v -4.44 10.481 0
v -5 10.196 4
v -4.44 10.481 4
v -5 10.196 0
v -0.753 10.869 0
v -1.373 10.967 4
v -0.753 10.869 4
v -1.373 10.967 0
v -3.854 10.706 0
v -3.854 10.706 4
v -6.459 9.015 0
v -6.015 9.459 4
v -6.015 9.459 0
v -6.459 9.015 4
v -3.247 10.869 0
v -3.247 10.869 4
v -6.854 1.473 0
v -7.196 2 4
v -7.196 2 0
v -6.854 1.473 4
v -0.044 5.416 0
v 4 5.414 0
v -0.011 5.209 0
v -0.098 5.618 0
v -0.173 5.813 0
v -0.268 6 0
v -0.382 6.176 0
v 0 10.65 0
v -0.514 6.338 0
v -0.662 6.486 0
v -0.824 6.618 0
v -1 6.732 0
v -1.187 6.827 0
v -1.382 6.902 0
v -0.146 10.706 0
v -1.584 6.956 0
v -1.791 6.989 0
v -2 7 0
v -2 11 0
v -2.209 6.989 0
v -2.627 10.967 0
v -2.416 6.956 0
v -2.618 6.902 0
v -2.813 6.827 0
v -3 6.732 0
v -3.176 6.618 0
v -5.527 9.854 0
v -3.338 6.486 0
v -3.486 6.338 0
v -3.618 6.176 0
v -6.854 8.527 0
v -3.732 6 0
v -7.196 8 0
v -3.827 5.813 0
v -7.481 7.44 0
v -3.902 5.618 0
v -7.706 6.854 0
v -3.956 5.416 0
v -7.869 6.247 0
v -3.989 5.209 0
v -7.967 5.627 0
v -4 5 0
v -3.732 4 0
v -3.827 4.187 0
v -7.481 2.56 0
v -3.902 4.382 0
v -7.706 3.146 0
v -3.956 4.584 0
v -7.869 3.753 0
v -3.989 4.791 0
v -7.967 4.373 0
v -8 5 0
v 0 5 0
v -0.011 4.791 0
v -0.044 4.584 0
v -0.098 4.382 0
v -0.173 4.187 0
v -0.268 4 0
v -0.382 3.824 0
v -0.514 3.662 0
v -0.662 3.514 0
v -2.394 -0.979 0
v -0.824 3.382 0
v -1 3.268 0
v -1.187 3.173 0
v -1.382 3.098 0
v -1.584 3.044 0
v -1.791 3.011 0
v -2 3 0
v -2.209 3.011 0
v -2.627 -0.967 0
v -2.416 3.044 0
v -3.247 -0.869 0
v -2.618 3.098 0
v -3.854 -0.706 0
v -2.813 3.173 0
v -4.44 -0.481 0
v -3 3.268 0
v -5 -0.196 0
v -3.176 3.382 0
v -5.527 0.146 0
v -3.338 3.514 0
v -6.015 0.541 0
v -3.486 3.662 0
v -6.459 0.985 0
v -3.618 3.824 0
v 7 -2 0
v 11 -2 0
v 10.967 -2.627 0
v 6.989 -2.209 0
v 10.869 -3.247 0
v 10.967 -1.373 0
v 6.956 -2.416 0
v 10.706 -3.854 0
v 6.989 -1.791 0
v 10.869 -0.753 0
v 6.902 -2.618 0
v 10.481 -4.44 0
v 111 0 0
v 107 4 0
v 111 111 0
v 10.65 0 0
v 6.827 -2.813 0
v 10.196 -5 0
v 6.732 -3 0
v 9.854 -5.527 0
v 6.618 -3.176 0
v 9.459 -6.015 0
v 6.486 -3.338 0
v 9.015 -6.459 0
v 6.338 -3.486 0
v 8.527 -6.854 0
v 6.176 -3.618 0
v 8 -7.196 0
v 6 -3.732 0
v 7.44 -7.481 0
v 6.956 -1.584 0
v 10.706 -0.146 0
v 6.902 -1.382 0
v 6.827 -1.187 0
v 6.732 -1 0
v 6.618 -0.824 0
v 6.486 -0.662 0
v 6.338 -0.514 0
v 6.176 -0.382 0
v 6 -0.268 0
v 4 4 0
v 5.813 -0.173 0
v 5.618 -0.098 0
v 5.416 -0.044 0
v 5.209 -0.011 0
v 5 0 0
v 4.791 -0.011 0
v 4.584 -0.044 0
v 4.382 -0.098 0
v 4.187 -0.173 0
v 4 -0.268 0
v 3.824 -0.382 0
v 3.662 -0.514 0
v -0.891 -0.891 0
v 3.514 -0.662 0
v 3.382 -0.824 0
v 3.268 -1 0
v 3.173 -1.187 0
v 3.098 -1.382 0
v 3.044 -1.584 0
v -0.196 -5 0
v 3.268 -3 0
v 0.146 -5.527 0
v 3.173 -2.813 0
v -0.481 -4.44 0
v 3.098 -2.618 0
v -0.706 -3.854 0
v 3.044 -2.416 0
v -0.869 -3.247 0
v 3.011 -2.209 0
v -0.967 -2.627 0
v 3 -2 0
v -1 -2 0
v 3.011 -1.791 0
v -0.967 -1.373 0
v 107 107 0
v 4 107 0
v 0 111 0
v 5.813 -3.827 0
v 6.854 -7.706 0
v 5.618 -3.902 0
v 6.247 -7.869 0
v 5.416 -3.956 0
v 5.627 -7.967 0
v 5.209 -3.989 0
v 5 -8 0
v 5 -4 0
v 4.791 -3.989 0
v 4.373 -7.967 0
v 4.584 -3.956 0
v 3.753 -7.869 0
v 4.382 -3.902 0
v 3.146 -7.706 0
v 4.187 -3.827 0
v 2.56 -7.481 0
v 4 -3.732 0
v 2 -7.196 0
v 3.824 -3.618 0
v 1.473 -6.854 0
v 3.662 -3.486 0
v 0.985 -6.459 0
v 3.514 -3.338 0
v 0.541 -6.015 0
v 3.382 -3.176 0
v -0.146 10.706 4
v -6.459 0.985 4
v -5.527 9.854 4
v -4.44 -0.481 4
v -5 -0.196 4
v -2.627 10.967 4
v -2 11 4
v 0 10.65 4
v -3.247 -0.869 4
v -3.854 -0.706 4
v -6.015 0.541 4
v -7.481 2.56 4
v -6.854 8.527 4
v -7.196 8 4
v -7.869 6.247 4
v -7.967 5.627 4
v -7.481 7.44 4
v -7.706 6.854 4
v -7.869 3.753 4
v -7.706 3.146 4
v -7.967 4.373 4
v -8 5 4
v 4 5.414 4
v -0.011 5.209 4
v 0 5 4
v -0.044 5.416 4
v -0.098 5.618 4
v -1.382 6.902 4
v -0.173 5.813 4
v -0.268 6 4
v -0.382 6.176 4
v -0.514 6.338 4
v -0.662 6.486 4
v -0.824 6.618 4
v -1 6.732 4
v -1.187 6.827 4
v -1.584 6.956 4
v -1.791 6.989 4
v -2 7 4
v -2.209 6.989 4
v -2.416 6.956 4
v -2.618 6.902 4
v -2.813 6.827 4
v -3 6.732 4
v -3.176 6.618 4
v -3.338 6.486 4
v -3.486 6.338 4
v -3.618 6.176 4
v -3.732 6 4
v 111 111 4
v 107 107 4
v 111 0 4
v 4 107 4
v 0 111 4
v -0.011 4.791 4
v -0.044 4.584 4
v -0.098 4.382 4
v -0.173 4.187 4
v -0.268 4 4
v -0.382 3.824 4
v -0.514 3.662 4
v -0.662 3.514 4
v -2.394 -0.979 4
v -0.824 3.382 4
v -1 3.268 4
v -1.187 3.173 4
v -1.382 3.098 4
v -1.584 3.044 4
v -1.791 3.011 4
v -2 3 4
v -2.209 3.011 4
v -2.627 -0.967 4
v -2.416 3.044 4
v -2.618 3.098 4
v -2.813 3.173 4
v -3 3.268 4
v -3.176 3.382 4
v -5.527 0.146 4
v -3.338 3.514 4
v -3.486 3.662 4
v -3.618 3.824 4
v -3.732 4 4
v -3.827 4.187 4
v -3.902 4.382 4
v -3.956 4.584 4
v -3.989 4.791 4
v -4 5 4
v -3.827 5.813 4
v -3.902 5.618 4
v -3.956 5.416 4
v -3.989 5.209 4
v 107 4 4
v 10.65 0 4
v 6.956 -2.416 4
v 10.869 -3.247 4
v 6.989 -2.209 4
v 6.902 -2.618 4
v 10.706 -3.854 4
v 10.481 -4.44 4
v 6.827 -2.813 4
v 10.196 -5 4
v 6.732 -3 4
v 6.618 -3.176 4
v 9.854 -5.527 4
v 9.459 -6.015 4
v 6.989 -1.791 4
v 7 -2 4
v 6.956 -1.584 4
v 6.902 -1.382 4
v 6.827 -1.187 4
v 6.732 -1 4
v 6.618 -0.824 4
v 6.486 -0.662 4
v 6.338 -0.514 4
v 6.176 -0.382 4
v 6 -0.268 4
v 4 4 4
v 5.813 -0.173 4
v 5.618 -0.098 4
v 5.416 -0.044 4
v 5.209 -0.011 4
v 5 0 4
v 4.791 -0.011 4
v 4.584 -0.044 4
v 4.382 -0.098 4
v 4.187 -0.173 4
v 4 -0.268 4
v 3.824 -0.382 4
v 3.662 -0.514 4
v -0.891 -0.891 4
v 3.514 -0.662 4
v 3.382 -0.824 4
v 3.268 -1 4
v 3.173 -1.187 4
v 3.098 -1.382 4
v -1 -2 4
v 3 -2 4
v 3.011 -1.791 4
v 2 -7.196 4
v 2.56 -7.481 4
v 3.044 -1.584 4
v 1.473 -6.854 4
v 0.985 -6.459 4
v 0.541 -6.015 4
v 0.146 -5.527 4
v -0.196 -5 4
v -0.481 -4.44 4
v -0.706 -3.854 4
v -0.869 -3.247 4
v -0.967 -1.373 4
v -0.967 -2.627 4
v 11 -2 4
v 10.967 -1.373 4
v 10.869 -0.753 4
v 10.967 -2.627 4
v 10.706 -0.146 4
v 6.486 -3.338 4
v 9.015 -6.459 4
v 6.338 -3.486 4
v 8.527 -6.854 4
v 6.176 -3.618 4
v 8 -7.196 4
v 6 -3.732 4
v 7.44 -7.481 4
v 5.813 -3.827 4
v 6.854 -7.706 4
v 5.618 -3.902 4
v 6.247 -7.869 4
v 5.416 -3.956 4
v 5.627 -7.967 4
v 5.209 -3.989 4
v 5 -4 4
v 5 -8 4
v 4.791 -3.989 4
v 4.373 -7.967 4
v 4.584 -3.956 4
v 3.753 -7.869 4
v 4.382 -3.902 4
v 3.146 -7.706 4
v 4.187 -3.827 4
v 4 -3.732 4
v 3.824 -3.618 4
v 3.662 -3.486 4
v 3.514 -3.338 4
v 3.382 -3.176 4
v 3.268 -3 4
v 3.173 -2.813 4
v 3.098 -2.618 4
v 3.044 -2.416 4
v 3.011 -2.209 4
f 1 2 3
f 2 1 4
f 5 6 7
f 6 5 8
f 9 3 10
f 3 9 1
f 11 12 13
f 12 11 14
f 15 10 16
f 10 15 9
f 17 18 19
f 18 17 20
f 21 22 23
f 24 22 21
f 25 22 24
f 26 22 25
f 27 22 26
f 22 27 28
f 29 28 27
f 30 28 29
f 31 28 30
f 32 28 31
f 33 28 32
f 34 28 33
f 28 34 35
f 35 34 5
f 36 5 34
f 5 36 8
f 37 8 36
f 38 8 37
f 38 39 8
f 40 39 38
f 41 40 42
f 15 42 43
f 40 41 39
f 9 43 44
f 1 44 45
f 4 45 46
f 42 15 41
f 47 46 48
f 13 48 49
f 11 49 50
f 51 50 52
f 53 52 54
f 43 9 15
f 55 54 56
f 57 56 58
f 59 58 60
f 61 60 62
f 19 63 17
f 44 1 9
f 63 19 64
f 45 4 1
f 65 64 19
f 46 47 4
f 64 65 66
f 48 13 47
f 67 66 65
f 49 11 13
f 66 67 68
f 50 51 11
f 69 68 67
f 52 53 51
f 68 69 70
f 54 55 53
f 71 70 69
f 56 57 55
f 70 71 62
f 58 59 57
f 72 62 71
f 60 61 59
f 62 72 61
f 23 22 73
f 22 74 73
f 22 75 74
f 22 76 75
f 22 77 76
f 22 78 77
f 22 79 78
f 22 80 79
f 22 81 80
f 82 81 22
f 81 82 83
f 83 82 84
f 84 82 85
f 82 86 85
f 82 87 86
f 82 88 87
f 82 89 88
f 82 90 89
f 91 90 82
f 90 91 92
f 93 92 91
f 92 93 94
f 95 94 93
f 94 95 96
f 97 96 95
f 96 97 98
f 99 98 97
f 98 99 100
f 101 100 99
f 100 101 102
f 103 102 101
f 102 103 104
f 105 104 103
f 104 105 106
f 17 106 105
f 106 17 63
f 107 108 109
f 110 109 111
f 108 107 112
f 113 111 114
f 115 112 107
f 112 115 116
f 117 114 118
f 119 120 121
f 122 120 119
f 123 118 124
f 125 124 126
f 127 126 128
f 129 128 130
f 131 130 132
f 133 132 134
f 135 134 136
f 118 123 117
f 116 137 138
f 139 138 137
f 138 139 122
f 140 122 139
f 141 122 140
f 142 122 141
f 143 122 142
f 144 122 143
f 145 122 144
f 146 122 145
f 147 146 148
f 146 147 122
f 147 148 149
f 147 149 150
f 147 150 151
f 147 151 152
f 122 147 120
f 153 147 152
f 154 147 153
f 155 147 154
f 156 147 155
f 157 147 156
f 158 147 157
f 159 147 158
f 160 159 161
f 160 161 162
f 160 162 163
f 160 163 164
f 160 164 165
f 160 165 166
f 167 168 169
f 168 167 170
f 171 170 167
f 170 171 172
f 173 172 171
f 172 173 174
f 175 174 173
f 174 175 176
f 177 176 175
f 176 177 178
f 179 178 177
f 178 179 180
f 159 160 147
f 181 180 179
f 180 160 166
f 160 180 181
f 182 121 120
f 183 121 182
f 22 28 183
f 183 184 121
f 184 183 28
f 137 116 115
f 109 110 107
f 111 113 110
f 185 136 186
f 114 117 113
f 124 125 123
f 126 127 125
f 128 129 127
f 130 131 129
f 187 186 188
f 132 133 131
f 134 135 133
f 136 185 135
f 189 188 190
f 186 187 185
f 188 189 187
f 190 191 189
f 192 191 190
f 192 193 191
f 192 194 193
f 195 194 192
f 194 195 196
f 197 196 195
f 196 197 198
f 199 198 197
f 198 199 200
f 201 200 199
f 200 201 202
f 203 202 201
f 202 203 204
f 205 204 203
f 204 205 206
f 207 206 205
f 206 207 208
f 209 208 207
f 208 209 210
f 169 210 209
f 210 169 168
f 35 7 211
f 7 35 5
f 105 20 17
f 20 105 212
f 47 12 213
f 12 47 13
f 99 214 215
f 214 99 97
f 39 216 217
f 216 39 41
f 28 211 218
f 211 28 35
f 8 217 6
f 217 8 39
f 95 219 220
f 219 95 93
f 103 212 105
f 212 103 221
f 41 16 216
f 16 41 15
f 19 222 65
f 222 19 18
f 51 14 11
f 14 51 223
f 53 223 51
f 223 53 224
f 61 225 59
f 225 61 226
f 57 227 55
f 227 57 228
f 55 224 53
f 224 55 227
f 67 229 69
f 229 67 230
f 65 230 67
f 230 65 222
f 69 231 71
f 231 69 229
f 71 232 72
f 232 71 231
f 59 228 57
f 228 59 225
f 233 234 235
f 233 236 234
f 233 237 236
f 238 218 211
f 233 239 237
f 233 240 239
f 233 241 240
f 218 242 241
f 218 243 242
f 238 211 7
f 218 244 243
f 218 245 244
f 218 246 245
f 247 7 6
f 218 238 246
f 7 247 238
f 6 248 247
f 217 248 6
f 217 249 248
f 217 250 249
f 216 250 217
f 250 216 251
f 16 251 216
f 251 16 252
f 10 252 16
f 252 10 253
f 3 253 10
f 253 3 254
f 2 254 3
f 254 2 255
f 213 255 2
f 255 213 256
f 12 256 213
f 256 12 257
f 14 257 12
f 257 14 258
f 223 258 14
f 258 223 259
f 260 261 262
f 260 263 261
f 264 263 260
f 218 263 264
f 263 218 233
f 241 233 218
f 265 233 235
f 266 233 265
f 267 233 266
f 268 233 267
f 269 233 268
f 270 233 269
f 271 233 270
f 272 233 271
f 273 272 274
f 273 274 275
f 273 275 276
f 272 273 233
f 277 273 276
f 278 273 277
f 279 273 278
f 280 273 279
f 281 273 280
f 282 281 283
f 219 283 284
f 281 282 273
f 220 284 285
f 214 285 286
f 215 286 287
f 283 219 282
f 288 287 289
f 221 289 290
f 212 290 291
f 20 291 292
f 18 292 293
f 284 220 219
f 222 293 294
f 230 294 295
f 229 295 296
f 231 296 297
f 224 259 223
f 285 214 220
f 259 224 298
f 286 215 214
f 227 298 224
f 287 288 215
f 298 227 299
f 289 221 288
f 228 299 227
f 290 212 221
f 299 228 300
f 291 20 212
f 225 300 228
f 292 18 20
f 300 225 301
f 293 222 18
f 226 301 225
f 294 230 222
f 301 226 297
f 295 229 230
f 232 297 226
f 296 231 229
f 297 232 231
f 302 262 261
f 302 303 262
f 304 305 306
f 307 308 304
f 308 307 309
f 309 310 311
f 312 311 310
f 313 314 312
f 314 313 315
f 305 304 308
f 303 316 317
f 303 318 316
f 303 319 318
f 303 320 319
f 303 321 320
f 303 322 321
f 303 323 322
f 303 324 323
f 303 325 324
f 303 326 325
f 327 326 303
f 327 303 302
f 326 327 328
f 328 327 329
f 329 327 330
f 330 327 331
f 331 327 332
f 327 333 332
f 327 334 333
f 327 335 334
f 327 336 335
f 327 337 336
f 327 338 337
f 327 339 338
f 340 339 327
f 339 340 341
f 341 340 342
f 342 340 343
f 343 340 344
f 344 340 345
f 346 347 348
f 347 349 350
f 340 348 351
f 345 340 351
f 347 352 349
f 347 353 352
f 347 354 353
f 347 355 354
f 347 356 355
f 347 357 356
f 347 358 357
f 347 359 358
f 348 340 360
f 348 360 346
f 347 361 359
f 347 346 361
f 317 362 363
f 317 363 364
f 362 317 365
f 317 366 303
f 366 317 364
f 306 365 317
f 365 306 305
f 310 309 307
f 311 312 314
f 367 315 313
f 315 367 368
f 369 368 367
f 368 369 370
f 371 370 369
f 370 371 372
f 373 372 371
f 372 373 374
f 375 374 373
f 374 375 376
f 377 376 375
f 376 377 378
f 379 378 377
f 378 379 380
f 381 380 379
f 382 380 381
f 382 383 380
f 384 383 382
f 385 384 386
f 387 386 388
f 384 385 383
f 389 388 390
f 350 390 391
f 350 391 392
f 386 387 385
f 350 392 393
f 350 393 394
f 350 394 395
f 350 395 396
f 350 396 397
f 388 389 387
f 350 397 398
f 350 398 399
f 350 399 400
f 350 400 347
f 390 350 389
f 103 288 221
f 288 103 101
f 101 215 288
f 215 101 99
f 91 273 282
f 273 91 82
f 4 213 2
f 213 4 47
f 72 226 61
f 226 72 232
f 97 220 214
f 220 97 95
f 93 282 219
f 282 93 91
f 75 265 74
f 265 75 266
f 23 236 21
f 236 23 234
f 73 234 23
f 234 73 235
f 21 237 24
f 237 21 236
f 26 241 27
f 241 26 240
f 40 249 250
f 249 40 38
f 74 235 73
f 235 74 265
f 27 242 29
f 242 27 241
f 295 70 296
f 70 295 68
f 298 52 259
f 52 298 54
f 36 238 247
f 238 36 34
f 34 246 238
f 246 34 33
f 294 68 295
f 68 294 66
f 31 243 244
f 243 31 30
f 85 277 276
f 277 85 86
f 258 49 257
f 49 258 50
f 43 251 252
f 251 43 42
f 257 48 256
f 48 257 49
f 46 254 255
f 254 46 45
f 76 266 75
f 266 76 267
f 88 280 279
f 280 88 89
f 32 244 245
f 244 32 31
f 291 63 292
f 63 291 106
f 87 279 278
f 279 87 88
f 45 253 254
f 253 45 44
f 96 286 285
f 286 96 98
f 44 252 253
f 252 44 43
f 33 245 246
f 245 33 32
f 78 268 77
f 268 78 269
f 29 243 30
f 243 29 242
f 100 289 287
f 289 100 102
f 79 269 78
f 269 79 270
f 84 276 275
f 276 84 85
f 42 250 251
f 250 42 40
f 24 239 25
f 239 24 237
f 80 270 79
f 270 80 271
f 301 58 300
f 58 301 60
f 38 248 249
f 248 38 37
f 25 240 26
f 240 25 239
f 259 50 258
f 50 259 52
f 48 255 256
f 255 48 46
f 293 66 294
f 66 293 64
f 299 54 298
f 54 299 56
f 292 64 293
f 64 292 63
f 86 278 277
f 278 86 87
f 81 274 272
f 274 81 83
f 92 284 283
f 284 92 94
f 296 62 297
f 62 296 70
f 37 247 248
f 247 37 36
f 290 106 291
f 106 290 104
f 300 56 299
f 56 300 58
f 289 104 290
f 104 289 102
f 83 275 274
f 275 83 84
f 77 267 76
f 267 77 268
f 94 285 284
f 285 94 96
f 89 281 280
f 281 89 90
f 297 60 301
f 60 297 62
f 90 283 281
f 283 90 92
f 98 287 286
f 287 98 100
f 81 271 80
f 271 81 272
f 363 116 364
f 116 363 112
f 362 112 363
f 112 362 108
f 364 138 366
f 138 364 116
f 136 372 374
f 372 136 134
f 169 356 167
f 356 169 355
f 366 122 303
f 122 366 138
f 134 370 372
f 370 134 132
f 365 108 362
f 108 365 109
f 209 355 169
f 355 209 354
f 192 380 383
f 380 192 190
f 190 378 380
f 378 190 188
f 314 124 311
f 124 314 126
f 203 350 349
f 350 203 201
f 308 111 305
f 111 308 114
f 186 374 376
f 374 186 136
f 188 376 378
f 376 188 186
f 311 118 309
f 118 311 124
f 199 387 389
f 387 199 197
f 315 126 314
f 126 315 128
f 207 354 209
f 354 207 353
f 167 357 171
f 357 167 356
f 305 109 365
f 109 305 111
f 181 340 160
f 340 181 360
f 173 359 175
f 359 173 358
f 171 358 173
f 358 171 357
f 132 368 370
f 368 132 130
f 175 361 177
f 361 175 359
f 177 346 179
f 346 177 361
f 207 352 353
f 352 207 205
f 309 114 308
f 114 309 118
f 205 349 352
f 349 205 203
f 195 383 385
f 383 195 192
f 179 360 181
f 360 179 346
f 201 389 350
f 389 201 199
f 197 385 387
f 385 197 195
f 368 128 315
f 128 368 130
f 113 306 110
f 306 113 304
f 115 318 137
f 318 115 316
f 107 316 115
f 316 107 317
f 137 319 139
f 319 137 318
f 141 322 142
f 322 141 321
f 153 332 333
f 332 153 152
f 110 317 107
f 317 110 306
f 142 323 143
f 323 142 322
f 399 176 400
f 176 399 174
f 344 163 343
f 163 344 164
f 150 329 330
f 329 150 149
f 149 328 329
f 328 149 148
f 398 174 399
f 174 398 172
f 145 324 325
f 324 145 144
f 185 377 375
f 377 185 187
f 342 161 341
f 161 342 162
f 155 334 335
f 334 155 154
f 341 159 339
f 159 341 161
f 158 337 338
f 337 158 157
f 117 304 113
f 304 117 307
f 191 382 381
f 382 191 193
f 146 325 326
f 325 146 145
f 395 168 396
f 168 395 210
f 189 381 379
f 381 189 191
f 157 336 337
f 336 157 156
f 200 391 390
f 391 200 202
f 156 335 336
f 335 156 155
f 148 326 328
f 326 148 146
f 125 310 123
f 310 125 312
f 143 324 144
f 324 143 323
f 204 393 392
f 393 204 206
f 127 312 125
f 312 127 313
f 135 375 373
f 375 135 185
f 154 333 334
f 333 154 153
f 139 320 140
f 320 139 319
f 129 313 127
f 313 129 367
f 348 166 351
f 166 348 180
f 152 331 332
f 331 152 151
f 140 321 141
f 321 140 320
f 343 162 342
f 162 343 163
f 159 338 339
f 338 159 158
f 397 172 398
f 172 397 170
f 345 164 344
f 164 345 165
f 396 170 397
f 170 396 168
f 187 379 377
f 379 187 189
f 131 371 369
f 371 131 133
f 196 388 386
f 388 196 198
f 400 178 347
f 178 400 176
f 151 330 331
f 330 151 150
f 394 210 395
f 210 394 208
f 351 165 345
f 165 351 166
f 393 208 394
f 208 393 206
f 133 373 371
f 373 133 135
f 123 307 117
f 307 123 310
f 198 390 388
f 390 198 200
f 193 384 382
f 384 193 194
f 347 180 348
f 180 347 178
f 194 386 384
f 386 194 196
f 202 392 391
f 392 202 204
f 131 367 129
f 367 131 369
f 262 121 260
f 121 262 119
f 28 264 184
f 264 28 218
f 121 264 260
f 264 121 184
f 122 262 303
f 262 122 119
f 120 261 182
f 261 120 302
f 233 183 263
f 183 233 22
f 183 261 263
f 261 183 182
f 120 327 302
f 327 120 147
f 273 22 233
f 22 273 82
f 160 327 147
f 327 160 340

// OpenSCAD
/*********** CLIP PILLAR **********************/

saeule = 100;       // width of the pillar
toleranz = 1.5;     // tolerance on each site
dicke = 4;          // material thickness



/******************** Processing *******************/

$fn = 60;

difference() {
    
    union() {
    
        cube([ saeule + ( toleranz * 2 ) + ( dicke * 2 ),
               saeule + ( toleranz * 2 ) + ( dicke * 2 ),
               dicke ]);
        
        translate([ -2, 1 + dicke, 0 ]) {
            difference() {
                
                cylinder( r = dicke + 2, h = dicke );
                
                cylinder( r = 2, h = dicke );
                
            }
        }
        
        translate([ 1 + dicke, -2, 0 ]) {
            difference() {
                
                cylinder( r = dicke + 2, h = dicke );
                
                cylinder( r = 2, h = dicke );
                
            }
        }
        
    }
    
    translate([ dicke, dicke, 0 ]) {
        cube([  saeule + ( toleranz * 2 ),
                saeule + ( toleranz * 2 ),
                dicke ]);
    }
    
    translate([ dicke * 5, dicke * 5, 0 ]) {
        rotate([ 0, 0, 135 ]) {
            cube([ 1, saeule, dicke ]);
        }
    }
    
}



    
